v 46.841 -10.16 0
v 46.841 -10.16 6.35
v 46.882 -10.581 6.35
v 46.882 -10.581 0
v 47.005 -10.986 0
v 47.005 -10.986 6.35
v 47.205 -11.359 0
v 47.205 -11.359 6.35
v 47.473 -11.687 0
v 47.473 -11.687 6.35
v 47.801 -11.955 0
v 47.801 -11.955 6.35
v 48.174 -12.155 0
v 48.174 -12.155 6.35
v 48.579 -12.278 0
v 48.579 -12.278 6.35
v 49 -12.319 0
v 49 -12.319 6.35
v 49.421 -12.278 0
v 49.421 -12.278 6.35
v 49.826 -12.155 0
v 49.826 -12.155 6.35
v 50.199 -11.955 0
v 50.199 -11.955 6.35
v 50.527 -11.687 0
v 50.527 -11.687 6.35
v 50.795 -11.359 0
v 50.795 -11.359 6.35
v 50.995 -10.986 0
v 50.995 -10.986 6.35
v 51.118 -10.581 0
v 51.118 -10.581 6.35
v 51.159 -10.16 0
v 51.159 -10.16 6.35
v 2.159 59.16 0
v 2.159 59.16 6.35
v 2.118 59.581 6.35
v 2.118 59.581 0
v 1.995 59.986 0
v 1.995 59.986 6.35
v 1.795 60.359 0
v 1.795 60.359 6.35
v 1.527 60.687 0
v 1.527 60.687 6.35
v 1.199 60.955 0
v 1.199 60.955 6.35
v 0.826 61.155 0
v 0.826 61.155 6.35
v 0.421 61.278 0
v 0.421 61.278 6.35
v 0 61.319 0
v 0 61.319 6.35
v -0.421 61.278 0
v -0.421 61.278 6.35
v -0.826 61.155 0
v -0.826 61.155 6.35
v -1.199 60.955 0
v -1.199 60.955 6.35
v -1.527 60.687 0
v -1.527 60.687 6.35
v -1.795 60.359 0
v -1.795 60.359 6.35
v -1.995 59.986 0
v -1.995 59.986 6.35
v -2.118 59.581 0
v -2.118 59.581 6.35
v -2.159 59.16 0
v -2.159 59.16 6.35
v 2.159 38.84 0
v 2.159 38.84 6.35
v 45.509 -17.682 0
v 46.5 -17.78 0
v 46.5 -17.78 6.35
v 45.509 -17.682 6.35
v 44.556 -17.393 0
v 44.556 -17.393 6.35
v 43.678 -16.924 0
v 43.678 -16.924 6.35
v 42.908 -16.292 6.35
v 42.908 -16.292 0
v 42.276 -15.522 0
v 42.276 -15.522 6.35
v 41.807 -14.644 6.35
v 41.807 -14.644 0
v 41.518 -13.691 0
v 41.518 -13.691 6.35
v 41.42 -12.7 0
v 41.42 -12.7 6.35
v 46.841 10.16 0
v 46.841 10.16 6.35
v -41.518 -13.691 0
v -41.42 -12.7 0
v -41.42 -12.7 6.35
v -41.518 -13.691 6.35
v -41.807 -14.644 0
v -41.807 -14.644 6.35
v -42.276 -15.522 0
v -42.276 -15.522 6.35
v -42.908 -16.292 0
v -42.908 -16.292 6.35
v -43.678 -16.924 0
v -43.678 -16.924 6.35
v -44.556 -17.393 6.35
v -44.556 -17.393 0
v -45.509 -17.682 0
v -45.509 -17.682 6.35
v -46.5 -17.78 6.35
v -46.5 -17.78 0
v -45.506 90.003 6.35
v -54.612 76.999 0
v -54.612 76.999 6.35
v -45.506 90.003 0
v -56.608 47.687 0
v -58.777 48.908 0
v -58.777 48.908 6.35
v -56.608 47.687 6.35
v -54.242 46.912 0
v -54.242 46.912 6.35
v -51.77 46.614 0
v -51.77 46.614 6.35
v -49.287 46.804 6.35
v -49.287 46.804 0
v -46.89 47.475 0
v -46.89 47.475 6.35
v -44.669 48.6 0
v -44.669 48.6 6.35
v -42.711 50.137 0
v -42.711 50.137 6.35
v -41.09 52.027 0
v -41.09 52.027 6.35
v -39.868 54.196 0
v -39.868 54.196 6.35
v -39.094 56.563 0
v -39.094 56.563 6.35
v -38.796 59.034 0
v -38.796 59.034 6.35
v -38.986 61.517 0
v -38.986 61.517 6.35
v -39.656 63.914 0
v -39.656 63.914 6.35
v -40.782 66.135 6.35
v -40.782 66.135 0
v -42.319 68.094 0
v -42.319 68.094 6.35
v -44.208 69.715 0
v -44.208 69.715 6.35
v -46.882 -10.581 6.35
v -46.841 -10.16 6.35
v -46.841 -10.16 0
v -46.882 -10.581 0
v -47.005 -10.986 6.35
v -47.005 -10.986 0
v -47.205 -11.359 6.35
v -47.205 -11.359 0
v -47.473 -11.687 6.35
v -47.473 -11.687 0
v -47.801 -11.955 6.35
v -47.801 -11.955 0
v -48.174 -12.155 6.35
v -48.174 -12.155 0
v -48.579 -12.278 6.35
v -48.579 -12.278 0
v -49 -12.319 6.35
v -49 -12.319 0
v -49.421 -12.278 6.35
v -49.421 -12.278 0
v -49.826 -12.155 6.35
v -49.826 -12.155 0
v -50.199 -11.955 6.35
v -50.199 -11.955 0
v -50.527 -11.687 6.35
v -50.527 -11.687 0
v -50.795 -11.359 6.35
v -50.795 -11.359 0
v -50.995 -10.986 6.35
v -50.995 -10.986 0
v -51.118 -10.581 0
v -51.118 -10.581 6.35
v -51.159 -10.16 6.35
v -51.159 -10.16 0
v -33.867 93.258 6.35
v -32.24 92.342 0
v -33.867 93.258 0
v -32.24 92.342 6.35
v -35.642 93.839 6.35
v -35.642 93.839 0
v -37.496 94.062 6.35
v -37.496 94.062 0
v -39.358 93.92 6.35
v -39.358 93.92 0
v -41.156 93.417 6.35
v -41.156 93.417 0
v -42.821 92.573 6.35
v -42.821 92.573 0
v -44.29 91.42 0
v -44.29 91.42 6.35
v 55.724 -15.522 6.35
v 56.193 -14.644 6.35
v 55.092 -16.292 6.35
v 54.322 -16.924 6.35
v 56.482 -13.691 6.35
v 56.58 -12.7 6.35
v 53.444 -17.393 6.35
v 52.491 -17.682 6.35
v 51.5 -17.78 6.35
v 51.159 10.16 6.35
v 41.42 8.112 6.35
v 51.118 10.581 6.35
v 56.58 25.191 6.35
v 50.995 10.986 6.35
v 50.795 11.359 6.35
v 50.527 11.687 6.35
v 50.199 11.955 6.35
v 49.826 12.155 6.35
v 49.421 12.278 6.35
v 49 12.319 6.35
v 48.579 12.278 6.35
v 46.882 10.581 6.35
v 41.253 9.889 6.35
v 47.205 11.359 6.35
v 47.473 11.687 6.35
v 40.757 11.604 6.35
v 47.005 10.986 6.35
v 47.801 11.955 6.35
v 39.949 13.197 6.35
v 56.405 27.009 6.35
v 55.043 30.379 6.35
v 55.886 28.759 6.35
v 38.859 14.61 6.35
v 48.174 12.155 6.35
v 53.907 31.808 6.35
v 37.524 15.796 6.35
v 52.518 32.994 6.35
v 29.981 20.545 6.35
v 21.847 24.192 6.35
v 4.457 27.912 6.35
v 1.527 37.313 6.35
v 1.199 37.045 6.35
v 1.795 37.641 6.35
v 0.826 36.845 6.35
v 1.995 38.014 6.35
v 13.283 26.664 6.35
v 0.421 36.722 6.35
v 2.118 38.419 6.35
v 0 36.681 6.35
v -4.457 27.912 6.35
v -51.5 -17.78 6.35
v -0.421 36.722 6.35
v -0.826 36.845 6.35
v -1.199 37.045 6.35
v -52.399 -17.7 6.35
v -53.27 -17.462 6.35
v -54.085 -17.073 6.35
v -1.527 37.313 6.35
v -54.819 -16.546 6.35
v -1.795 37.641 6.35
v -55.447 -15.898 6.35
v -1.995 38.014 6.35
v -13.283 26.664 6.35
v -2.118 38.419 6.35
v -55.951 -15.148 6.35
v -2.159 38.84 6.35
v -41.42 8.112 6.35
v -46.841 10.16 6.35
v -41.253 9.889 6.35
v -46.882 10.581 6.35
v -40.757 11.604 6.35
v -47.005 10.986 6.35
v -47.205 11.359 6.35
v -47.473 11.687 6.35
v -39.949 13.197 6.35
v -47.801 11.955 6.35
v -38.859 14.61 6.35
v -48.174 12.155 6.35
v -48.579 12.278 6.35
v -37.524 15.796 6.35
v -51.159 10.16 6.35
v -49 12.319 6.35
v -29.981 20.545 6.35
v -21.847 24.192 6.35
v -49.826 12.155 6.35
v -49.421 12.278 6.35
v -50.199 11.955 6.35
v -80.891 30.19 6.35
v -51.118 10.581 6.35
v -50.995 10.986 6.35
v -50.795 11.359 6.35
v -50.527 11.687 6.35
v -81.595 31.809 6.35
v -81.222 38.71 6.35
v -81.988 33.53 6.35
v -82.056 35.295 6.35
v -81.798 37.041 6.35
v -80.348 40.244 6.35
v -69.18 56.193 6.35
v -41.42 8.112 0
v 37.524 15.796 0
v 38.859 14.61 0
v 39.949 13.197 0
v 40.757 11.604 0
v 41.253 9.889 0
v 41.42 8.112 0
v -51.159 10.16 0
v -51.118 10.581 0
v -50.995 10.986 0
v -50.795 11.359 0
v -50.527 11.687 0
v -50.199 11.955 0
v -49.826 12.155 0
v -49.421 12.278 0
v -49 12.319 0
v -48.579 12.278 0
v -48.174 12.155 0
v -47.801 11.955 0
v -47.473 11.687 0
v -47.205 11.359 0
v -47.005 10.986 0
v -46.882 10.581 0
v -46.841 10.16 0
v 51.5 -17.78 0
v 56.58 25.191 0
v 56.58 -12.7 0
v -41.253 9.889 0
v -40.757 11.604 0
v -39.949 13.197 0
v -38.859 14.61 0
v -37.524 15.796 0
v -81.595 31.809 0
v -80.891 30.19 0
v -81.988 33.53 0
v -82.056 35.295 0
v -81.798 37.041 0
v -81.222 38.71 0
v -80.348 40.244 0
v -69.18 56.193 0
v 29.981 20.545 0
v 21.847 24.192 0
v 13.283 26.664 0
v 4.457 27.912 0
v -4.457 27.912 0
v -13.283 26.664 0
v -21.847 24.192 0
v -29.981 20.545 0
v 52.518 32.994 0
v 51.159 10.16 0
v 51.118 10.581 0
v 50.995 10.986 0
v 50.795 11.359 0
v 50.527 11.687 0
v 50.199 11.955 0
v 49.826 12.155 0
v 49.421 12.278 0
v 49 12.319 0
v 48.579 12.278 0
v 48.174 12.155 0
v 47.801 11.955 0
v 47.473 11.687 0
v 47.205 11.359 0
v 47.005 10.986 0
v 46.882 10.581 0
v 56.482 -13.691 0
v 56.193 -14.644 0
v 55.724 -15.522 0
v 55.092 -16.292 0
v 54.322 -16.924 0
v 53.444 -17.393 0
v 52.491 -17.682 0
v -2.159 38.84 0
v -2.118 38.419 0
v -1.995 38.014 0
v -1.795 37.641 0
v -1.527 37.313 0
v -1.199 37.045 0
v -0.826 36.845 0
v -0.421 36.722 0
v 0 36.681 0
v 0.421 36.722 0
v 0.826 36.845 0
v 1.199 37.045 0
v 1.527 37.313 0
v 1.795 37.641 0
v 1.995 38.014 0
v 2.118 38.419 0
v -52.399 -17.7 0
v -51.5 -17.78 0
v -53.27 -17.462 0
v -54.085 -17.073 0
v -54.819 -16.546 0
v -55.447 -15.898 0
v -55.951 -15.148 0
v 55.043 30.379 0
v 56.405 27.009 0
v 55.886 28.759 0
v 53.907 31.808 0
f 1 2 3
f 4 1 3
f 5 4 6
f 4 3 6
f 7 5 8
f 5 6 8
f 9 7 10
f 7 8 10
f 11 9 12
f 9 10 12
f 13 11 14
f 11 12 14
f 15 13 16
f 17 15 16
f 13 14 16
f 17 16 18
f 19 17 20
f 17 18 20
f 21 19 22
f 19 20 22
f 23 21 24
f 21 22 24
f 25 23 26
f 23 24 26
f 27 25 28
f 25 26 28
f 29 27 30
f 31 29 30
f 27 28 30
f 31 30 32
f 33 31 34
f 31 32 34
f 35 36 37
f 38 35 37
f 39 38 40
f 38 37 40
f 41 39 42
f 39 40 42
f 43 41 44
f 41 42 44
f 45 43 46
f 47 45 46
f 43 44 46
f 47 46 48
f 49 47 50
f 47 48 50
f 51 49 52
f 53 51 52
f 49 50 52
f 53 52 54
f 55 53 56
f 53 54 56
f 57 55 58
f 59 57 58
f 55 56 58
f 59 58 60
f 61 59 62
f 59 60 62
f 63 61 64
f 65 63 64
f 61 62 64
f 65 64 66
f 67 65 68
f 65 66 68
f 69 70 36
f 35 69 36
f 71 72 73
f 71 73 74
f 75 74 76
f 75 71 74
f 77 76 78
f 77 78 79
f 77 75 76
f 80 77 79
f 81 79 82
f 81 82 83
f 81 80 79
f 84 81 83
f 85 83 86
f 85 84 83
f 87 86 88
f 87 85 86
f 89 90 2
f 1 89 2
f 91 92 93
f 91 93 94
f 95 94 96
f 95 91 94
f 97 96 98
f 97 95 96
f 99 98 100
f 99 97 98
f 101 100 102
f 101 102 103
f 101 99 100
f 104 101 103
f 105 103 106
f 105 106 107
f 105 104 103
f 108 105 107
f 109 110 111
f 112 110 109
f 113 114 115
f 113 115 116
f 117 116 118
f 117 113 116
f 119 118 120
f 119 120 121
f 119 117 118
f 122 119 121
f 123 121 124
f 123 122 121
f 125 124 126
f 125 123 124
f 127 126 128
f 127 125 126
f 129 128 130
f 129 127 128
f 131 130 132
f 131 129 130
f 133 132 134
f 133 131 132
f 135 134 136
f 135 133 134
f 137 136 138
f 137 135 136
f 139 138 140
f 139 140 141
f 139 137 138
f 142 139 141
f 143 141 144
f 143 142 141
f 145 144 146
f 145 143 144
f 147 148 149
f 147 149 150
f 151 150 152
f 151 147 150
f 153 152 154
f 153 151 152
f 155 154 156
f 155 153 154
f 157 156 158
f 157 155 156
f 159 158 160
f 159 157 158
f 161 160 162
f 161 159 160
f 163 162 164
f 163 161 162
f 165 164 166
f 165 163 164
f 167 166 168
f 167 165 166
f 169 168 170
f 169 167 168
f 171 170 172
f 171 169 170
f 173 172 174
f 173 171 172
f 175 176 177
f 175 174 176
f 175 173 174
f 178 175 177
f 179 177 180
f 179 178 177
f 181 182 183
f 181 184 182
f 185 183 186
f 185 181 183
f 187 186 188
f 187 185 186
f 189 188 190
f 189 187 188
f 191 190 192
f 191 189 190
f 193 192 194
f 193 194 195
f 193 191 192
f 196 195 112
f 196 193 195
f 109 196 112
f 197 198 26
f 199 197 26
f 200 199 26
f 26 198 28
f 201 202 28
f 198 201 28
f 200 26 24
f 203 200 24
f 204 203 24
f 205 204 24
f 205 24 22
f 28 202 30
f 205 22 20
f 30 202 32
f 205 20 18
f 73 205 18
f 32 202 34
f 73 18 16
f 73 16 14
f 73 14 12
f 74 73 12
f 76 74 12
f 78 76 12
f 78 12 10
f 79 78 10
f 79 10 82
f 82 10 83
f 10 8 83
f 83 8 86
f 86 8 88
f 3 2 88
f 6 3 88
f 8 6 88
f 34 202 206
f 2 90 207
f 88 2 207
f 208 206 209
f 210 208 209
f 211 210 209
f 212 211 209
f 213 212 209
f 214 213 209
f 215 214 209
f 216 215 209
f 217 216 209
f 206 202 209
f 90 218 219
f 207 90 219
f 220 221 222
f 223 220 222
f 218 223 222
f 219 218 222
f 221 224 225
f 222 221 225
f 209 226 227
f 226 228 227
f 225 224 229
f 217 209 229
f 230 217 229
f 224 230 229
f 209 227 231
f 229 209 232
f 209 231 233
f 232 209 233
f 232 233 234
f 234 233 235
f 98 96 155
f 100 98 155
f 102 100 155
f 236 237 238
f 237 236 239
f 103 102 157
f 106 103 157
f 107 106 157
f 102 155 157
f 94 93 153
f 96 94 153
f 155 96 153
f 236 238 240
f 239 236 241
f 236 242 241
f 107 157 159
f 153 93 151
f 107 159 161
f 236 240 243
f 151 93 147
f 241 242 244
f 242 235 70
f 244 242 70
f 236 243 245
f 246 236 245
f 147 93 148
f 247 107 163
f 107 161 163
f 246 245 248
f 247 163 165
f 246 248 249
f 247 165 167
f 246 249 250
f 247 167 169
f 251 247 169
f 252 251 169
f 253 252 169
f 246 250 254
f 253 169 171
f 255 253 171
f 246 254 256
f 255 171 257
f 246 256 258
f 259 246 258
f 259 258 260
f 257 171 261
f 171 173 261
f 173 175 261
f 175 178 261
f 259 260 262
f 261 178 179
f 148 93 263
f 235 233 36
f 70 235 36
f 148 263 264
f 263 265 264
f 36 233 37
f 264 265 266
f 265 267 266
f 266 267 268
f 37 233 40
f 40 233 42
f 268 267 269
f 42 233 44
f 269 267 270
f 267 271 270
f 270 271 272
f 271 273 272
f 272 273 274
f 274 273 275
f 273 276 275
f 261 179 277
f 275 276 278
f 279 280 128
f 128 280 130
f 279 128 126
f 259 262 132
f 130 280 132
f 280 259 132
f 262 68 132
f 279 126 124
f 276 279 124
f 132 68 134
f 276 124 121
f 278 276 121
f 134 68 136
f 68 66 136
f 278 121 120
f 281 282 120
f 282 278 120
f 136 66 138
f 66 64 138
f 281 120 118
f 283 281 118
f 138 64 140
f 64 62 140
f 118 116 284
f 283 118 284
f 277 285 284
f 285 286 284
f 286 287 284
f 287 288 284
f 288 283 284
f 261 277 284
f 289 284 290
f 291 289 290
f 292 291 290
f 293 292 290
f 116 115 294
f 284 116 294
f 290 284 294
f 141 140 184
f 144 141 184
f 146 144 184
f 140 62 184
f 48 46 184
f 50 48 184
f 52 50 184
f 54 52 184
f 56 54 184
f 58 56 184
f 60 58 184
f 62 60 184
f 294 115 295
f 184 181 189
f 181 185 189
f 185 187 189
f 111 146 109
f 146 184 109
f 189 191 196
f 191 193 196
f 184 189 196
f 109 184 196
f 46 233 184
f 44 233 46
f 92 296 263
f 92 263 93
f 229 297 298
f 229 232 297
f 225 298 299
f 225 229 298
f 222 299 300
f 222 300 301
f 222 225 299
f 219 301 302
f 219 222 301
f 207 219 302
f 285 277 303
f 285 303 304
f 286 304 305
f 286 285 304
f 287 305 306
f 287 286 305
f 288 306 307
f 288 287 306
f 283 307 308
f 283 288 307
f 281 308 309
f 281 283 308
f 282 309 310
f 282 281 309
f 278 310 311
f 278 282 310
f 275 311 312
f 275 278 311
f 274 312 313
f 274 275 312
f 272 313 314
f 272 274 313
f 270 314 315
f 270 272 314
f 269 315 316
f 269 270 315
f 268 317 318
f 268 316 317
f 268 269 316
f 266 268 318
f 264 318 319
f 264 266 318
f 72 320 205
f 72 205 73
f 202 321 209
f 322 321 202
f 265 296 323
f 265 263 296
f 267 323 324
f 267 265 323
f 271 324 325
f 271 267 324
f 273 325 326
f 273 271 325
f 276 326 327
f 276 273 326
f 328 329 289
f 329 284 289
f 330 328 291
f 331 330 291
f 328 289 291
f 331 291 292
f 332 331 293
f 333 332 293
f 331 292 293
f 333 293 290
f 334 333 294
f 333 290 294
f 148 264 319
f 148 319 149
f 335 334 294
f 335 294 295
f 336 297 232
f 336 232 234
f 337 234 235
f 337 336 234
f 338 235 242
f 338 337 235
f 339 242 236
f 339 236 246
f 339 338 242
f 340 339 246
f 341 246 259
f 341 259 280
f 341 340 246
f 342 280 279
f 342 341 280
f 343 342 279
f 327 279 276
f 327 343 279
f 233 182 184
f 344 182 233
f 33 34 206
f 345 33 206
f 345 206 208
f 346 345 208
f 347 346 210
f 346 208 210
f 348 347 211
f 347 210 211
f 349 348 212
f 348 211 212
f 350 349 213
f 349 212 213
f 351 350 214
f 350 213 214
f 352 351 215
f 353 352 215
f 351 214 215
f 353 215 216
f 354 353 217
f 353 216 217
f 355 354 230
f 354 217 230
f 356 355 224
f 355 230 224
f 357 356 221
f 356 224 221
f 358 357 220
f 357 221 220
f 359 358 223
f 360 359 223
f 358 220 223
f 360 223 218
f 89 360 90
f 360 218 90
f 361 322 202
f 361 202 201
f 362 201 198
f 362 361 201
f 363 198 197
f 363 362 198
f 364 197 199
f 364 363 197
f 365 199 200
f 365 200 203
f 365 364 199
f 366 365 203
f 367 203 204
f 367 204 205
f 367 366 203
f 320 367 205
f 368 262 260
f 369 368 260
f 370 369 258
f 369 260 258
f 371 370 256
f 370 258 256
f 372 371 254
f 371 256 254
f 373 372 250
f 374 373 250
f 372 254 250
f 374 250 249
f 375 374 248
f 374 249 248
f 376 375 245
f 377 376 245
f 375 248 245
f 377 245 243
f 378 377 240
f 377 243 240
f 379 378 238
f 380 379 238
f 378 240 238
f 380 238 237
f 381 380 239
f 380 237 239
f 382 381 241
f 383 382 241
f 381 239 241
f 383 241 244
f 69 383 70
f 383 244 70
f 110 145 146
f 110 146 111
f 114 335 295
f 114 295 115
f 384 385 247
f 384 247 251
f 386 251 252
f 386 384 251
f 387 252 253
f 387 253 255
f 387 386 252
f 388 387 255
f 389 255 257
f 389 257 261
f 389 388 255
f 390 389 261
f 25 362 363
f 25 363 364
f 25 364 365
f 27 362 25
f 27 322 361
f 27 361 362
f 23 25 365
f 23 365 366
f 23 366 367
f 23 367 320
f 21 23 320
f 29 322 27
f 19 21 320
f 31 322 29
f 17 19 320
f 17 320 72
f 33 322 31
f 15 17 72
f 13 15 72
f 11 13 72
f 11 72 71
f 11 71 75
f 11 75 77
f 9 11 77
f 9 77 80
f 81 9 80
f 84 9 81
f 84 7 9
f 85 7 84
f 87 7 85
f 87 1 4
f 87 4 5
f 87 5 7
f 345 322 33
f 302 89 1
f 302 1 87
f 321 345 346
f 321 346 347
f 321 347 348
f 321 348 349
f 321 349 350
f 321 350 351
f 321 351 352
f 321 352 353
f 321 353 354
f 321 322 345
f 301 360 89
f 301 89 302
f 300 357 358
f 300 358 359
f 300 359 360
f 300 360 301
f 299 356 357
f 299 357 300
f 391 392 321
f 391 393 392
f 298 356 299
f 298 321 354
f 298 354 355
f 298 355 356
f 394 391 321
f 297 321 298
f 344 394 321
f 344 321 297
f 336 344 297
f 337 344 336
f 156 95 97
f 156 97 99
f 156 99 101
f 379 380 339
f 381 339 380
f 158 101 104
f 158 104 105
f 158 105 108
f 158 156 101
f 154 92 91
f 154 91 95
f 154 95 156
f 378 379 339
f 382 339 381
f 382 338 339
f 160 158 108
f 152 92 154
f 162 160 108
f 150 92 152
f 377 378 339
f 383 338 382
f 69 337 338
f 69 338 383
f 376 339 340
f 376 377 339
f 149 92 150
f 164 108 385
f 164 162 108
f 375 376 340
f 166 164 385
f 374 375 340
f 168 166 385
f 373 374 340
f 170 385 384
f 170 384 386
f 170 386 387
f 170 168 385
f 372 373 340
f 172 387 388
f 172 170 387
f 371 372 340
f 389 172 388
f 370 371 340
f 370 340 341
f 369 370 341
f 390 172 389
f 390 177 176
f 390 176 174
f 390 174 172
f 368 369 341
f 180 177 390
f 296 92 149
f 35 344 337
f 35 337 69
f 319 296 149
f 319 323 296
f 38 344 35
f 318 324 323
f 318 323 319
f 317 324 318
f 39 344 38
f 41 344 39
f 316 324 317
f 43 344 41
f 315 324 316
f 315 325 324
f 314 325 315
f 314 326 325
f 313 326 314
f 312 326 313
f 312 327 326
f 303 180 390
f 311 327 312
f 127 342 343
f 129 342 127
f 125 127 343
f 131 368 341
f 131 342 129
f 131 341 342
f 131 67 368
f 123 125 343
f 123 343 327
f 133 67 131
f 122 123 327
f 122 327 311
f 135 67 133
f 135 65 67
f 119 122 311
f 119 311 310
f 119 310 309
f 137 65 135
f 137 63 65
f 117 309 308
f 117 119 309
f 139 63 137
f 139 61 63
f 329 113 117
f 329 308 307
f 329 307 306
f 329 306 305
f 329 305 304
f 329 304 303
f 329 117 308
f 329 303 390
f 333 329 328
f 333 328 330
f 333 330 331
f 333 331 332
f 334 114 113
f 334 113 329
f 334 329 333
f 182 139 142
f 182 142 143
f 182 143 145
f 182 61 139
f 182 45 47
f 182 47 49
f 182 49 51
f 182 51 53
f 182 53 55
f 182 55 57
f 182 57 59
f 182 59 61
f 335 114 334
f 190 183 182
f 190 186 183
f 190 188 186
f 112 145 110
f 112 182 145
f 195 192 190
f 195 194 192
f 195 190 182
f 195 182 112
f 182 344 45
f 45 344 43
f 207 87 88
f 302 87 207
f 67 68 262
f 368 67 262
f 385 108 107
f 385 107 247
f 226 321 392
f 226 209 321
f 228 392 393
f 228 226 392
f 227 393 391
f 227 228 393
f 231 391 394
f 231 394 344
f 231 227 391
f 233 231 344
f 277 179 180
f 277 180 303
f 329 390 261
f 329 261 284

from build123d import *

# Parameters (mm, degrees)
EXTRUDE1_DEPTH     = 6.35
CUT_EXTRUDE3_REACH = 8.35
FILLET1_R          = 9.525


with BuildPart() as part:
    # Sketch1 → Extrude1 (new body)
    with BuildSketch(Plane.XY):
        with BuildLine():
            Line((-41.42, 12.7), (-41.42, -12.7))
            ThreePointArc((-41.42, -12.7), (-42.907897552, -16.292102448), (-46.5, -17.78))
            Line((-46.5, -17.78), (-51.5, -17.78))
            ThreePointArc((-51.5, -17.78), (-54.085377818, -17.072896242), (-55.951019269, -15.148433677))
            Line((-55.951019269, -15.148433677), (-83.74924785, 35.386098748))
            Line((-83.74924785, 35.386098748), (-69.180406366, 56.192560673))
            Line((-69.180406366, 56.192560673), (-58.777175404, 48.908139931))
            ThreePointArc((-58.777175404, 48.908139931), (-41.0895237, 52.026950152), (-44.208333921, 69.714601856))
            Line((-44.208333921, 69.714601856), (-54.611564883, 76.999022598))
            Line((-54.611564883, 76.999022598), (-40.0427234, 97.805484523))
            Line((-40.0427234, 97.805484523), (56.58, 30.149525236))
            Line((56.58, 30.149525236), (56.58, -12.7))
            ThreePointArc((56.58, -12.7), (55.092102448, -16.292102448), (51.5, -17.78))
            Line((51.5, -17.78), (46.5, -17.78))
            ThreePointArc((46.5, -17.78), (42.907897552, -16.292102448), (41.42, -12.7))
            Line((41.42, -12.7), (41.42, 12.7))
            ThreePointArc((41.42, 12.7), (0, 28.068579909), (-41.42, 12.7))
        make_face()
    extrude(amount=EXTRUDE1_DEPTH)

    # Sketch4 → Cut-Extrude3 (cut, up to next)
    with BuildSketch(Plane.XY.offset(6.35), mode=Mode.PRIVATE) as cut_extrude3_sk1:
        with BuildLine():
            Line((-51.159, -10.16), (-51.159, 10.16))
            ThreePointArc((-51.159, 10.16), (-49, 12.319), (-46.841, 10.16))
            Line((-46.841, 10.16), (-46.841, -10.16))
            ThreePointArc((-46.841, -10.16), (-49, -12.319), (-51.159, -10.16))
        make_face()
    cut_extrude3_tool1 = extrude(cut_extrude3_sk1.sketch, amount=-CUT_EXTRUDE3_REACH, mode=Mode.PRIVATE) & part.part
    add(cut_extrude3_tool1.solids().sort_by_distance((-49, 0, 6.35))[0], mode=Mode.SUBTRACT)
    # Sketch4 → Cut-Extrude3 (cut, up to next)
    with BuildSketch(Plane.XY.offset(6.35), mode=Mode.PRIVATE) as cut_extrude3_sk2:
        with BuildLine():
            Line((2.159, 38.84), (2.159, 59.16))
            ThreePointArc((2.159, 59.16), (0, 61.319), (-2.159, 59.16))
            Line((-2.159, 59.16), (-2.159, 38.84))
            ThreePointArc((-2.159, 38.84), (0, 36.681), (2.159, 38.84))
        make_face()
    cut_extrude3_tool2 = extrude(cut_extrude3_sk2.sketch, amount=-CUT_EXTRUDE3_REACH, mode=Mode.PRIVATE) & part.part
    add(cut_extrude3_tool2.solids().sort_by_distance((0, 49, 6.35))[0], mode=Mode.SUBTRACT)
    # Sketch4 → Cut-Extrude3 (cut, up to next)
    with BuildSketch(Plane.XY.offset(6.35), mode=Mode.PRIVATE) as cut_extrude3_sk3:
        with BuildLine():
            Line((51.159, -10.16), (51.159, 10.16))
            ThreePointArc((51.159, 10.16), (49, 12.319), (46.841, 10.16))
            Line((46.841, 10.16), (46.841, -10.16))
            ThreePointArc((46.841, -10.16), (49, -12.319), (51.159, -10.16))
        make_face()
    cut_extrude3_tool3 = extrude(cut_extrude3_sk3.sketch, amount=-CUT_EXTRUDE3_REACH, mode=Mode.PRIVATE) & part.part
    add(cut_extrude3_tool3.solids().sort_by_distance((49, 0, 6.35))[0], mode=Mode.SUBTRACT)

    # Fillet1
    fillet1_edges = [part.edges().sort_by_distance(p)[0] for p in [
        (-41.42, 12.7, 3.175),
        (-83.74924785, 35.386098748, 3.175),
        (-40.0427234, 97.805484523, 3.175),
        (56.58, 30.149525236, 3.175),
        (41.42, 12.7, 3.175),
    ]]
    fillet(fillet1_edges, radius=FILLET1_R)


solid = part.part
